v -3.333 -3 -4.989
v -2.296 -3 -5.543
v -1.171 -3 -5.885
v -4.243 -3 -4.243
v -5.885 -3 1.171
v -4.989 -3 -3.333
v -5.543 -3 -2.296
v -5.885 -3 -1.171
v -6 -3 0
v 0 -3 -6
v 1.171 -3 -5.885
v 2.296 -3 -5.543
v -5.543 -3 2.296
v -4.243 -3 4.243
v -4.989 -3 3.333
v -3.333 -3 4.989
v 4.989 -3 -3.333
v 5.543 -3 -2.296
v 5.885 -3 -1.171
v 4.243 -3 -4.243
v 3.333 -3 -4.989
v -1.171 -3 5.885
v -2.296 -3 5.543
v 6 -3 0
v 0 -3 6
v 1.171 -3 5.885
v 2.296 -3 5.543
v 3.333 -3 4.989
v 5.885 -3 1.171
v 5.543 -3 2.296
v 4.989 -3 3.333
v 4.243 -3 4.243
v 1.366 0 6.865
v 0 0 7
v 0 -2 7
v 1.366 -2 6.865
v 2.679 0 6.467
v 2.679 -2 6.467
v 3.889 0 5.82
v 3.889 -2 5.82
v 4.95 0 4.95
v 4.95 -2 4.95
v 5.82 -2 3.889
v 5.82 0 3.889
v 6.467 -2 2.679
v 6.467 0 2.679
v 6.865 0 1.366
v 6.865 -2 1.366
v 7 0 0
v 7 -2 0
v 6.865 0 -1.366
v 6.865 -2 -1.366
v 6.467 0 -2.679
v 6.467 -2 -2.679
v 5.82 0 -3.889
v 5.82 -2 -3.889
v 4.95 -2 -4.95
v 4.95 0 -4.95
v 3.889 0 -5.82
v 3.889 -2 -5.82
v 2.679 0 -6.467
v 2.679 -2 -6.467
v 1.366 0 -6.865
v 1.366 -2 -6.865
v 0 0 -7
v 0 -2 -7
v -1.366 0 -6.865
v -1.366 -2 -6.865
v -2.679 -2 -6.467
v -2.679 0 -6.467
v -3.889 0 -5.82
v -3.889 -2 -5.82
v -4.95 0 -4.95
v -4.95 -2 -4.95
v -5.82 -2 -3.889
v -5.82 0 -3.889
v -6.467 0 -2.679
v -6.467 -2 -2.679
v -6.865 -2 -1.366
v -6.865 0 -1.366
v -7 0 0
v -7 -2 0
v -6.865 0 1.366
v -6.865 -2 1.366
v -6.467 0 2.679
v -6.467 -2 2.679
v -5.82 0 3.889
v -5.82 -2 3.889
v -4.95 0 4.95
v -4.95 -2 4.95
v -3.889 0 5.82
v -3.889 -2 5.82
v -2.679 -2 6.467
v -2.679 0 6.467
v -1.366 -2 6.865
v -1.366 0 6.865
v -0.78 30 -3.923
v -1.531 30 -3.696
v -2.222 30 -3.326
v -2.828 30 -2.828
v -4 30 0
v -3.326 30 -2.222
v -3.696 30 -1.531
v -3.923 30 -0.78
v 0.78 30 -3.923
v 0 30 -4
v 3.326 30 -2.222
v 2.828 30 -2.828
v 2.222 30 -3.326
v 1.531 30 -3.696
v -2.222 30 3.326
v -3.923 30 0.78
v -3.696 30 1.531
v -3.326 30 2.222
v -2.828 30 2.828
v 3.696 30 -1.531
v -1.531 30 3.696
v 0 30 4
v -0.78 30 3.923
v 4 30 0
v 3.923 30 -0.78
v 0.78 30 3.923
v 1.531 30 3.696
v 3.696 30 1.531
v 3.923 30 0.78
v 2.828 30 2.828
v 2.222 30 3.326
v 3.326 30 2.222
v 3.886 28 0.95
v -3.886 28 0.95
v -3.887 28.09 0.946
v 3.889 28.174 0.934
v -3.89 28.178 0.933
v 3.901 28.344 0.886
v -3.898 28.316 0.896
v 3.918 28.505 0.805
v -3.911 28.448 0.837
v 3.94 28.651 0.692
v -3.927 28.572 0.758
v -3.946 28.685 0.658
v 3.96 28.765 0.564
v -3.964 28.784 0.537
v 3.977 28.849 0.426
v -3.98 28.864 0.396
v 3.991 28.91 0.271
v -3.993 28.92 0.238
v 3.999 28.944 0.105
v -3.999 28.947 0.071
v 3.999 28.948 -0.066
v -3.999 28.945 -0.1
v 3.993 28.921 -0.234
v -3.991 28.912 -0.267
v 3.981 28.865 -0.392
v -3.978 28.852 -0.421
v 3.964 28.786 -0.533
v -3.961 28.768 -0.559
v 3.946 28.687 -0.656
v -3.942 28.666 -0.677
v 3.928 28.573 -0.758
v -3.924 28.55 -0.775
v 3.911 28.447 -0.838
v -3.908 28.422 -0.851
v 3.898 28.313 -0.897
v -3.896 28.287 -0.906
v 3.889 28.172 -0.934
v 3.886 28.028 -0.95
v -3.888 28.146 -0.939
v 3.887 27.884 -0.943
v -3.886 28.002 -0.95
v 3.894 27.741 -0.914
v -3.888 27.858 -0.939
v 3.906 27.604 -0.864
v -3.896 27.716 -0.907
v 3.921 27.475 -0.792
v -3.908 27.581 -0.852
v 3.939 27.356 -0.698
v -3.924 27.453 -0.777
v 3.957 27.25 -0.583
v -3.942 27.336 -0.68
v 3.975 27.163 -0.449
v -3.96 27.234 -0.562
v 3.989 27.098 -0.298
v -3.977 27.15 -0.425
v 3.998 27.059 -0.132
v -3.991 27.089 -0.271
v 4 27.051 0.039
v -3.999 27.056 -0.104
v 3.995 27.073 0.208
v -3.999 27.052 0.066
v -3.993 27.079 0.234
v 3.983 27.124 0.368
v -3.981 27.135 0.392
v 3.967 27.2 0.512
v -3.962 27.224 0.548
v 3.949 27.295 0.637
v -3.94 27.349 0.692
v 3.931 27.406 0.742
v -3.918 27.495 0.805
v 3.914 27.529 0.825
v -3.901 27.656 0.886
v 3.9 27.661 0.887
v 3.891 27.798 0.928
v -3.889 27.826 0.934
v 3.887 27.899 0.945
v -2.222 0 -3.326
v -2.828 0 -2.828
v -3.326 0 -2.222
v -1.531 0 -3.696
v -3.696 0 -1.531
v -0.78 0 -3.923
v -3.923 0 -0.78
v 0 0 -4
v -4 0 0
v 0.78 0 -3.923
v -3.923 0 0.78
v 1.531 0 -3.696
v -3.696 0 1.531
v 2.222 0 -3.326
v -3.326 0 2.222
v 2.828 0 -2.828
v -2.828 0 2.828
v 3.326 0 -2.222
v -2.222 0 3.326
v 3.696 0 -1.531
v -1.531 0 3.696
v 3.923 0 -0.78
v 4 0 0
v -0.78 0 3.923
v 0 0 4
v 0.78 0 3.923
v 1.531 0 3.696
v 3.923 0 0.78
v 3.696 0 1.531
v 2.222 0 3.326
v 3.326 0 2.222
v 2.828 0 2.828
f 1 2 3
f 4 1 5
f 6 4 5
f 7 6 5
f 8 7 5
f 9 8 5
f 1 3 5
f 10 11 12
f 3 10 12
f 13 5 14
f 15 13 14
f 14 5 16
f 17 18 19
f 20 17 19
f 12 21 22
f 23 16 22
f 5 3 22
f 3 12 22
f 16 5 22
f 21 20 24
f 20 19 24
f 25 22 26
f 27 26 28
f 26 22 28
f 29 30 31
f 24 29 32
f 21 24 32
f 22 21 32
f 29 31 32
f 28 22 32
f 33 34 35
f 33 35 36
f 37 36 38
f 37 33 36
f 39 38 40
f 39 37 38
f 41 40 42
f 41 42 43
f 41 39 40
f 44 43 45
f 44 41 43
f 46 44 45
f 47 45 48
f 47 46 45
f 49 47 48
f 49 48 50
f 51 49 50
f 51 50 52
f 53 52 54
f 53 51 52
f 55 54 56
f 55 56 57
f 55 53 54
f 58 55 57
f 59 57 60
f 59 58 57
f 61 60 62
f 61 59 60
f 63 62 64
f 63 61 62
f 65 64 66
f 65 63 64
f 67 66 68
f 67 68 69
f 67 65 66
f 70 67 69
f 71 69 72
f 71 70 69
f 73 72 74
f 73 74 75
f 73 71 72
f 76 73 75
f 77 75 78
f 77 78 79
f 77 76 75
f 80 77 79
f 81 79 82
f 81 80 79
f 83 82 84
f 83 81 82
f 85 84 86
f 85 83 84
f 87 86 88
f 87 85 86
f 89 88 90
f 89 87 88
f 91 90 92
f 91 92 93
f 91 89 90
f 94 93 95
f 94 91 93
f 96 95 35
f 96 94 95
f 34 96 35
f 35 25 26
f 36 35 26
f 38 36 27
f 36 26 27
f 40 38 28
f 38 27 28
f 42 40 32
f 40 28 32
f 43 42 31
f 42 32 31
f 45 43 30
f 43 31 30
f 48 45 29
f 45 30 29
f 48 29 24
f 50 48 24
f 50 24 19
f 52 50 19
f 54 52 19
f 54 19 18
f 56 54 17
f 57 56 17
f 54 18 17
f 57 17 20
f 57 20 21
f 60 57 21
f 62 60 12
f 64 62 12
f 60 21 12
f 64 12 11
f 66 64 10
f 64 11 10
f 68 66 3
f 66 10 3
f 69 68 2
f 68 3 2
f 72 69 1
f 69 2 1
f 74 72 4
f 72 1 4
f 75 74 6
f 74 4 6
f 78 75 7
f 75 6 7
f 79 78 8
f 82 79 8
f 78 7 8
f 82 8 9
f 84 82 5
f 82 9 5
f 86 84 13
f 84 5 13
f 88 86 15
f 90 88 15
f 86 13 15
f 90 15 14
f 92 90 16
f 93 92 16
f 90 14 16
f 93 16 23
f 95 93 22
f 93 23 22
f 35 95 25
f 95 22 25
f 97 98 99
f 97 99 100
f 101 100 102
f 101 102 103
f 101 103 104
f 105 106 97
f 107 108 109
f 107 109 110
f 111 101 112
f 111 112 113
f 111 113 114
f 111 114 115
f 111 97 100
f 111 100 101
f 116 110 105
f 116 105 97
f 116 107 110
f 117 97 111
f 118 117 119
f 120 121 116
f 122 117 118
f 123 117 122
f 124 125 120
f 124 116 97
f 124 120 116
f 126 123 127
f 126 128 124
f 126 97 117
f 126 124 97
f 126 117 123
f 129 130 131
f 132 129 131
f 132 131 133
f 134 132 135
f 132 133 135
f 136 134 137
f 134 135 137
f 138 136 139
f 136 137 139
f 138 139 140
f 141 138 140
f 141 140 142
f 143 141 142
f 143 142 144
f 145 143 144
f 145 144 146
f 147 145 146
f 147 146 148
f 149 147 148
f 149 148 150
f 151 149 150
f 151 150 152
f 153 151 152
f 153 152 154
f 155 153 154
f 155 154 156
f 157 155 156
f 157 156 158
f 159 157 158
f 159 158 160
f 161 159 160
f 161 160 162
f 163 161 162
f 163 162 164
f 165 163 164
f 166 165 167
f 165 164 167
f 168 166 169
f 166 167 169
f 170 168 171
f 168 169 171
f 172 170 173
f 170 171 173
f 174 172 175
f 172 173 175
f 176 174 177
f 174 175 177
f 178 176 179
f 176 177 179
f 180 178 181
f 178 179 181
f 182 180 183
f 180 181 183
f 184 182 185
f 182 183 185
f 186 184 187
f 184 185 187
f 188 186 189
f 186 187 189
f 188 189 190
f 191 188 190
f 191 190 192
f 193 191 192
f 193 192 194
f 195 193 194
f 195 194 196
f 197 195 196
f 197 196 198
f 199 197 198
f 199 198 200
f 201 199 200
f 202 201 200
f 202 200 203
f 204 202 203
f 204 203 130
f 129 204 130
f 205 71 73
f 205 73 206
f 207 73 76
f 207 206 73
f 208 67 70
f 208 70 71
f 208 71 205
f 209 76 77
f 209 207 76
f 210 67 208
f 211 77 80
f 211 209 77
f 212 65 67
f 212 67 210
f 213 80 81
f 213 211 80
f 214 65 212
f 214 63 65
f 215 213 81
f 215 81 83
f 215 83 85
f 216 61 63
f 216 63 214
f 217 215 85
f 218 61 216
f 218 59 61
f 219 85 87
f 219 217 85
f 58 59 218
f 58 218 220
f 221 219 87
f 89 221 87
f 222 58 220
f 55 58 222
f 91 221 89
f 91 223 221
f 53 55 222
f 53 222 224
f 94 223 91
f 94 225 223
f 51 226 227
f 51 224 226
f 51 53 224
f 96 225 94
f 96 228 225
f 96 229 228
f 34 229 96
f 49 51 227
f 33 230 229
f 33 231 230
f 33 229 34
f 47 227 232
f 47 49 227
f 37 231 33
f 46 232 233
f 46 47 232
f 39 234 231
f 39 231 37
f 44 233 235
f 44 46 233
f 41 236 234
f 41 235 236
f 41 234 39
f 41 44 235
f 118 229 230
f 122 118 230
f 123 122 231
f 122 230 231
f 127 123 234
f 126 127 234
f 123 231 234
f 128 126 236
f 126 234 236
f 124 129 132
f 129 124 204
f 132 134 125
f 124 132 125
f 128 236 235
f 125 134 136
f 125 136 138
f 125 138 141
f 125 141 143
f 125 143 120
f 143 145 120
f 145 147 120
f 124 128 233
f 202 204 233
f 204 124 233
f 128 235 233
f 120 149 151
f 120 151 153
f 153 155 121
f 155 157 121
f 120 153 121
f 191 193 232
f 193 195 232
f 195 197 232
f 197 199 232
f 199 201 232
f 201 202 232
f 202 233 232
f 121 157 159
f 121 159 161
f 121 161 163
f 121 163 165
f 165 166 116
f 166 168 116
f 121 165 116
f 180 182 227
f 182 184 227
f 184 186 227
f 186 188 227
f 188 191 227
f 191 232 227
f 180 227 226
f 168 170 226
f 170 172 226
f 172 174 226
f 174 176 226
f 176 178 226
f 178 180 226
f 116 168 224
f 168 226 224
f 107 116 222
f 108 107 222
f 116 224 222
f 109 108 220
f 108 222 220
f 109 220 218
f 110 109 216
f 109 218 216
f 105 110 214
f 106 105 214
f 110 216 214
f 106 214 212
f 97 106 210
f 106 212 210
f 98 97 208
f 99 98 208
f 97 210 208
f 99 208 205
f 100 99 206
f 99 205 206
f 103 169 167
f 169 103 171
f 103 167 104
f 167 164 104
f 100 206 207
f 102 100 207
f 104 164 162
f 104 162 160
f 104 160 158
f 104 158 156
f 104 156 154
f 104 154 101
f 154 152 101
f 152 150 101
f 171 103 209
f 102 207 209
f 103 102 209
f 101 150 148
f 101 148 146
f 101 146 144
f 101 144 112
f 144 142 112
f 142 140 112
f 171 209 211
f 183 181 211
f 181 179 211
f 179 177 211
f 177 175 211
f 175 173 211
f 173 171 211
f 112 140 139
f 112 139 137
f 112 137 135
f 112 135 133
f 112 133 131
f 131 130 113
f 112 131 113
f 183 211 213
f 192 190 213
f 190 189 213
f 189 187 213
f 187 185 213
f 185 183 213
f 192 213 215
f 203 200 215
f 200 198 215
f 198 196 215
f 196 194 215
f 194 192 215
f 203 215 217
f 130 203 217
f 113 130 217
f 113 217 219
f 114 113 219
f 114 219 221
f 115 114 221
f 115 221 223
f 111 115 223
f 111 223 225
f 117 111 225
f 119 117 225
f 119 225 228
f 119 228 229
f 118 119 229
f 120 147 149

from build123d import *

# Parameters (mm, degrees)
SKETCH1_R           = 7
BOSS_EXTRUDE1_DEPTH = 3
SKETCH1_3_R         = 4
BOSS_EXTRUDE2_DEPTH = 30
CHAMFER1_SIZE       = 1
CUT_EXTRUDE1_REACH  = 34.711
SKETCH2_R           = 0.95


with BuildPart() as part:
    # Sketch1 → Boss-Extrude1 (new body)
    with BuildSketch(Plane(origin=(0, 0, 0), x_dir=(1, 0, 0), z_dir=(0, 1, 0))):
        Circle(SKETCH1_R)
    extrude(amount=-BOSS_EXTRUDE1_DEPTH)

    # Sketch1<3> → Boss-Extrude2 (add)
    with BuildSketch(Plane(origin=(0, 0, 0), x_dir=(1, 0, 0), z_dir=(0, 1, 0))):
        Circle(SKETCH1_3_R)
    extrude(amount=BOSS_EXTRUDE2_DEPTH)

    # Chamfer1
    chamfer1_edges = [part.edges().sort_by_distance(p)[0] for p in [
        (-7, -3, 0),
    ]]
    chamfer(chamfer1_edges, length=CHAMFER1_SIZE)

    # Sketch2 → Cut-Extrude1 (cut, up to next)
    with BuildSketch(Plane.ZY.offset(4), mode=Mode.PRIVATE) as cut_extrude1_sk1:
        with Locations((0, 28)):
            Circle(SKETCH2_R)
    cut_extrude1_tool1 = extrude(cut_extrude1_sk1.sketch, amount=-CUT_EXTRUDE1_REACH, mode=Mode.PRIVATE) & part.part
    add(cut_extrude1_tool1.solids().sort_by_distance((-4, 28, 0))[0], mode=Mode.SUBTRACT)


solid = part.part
